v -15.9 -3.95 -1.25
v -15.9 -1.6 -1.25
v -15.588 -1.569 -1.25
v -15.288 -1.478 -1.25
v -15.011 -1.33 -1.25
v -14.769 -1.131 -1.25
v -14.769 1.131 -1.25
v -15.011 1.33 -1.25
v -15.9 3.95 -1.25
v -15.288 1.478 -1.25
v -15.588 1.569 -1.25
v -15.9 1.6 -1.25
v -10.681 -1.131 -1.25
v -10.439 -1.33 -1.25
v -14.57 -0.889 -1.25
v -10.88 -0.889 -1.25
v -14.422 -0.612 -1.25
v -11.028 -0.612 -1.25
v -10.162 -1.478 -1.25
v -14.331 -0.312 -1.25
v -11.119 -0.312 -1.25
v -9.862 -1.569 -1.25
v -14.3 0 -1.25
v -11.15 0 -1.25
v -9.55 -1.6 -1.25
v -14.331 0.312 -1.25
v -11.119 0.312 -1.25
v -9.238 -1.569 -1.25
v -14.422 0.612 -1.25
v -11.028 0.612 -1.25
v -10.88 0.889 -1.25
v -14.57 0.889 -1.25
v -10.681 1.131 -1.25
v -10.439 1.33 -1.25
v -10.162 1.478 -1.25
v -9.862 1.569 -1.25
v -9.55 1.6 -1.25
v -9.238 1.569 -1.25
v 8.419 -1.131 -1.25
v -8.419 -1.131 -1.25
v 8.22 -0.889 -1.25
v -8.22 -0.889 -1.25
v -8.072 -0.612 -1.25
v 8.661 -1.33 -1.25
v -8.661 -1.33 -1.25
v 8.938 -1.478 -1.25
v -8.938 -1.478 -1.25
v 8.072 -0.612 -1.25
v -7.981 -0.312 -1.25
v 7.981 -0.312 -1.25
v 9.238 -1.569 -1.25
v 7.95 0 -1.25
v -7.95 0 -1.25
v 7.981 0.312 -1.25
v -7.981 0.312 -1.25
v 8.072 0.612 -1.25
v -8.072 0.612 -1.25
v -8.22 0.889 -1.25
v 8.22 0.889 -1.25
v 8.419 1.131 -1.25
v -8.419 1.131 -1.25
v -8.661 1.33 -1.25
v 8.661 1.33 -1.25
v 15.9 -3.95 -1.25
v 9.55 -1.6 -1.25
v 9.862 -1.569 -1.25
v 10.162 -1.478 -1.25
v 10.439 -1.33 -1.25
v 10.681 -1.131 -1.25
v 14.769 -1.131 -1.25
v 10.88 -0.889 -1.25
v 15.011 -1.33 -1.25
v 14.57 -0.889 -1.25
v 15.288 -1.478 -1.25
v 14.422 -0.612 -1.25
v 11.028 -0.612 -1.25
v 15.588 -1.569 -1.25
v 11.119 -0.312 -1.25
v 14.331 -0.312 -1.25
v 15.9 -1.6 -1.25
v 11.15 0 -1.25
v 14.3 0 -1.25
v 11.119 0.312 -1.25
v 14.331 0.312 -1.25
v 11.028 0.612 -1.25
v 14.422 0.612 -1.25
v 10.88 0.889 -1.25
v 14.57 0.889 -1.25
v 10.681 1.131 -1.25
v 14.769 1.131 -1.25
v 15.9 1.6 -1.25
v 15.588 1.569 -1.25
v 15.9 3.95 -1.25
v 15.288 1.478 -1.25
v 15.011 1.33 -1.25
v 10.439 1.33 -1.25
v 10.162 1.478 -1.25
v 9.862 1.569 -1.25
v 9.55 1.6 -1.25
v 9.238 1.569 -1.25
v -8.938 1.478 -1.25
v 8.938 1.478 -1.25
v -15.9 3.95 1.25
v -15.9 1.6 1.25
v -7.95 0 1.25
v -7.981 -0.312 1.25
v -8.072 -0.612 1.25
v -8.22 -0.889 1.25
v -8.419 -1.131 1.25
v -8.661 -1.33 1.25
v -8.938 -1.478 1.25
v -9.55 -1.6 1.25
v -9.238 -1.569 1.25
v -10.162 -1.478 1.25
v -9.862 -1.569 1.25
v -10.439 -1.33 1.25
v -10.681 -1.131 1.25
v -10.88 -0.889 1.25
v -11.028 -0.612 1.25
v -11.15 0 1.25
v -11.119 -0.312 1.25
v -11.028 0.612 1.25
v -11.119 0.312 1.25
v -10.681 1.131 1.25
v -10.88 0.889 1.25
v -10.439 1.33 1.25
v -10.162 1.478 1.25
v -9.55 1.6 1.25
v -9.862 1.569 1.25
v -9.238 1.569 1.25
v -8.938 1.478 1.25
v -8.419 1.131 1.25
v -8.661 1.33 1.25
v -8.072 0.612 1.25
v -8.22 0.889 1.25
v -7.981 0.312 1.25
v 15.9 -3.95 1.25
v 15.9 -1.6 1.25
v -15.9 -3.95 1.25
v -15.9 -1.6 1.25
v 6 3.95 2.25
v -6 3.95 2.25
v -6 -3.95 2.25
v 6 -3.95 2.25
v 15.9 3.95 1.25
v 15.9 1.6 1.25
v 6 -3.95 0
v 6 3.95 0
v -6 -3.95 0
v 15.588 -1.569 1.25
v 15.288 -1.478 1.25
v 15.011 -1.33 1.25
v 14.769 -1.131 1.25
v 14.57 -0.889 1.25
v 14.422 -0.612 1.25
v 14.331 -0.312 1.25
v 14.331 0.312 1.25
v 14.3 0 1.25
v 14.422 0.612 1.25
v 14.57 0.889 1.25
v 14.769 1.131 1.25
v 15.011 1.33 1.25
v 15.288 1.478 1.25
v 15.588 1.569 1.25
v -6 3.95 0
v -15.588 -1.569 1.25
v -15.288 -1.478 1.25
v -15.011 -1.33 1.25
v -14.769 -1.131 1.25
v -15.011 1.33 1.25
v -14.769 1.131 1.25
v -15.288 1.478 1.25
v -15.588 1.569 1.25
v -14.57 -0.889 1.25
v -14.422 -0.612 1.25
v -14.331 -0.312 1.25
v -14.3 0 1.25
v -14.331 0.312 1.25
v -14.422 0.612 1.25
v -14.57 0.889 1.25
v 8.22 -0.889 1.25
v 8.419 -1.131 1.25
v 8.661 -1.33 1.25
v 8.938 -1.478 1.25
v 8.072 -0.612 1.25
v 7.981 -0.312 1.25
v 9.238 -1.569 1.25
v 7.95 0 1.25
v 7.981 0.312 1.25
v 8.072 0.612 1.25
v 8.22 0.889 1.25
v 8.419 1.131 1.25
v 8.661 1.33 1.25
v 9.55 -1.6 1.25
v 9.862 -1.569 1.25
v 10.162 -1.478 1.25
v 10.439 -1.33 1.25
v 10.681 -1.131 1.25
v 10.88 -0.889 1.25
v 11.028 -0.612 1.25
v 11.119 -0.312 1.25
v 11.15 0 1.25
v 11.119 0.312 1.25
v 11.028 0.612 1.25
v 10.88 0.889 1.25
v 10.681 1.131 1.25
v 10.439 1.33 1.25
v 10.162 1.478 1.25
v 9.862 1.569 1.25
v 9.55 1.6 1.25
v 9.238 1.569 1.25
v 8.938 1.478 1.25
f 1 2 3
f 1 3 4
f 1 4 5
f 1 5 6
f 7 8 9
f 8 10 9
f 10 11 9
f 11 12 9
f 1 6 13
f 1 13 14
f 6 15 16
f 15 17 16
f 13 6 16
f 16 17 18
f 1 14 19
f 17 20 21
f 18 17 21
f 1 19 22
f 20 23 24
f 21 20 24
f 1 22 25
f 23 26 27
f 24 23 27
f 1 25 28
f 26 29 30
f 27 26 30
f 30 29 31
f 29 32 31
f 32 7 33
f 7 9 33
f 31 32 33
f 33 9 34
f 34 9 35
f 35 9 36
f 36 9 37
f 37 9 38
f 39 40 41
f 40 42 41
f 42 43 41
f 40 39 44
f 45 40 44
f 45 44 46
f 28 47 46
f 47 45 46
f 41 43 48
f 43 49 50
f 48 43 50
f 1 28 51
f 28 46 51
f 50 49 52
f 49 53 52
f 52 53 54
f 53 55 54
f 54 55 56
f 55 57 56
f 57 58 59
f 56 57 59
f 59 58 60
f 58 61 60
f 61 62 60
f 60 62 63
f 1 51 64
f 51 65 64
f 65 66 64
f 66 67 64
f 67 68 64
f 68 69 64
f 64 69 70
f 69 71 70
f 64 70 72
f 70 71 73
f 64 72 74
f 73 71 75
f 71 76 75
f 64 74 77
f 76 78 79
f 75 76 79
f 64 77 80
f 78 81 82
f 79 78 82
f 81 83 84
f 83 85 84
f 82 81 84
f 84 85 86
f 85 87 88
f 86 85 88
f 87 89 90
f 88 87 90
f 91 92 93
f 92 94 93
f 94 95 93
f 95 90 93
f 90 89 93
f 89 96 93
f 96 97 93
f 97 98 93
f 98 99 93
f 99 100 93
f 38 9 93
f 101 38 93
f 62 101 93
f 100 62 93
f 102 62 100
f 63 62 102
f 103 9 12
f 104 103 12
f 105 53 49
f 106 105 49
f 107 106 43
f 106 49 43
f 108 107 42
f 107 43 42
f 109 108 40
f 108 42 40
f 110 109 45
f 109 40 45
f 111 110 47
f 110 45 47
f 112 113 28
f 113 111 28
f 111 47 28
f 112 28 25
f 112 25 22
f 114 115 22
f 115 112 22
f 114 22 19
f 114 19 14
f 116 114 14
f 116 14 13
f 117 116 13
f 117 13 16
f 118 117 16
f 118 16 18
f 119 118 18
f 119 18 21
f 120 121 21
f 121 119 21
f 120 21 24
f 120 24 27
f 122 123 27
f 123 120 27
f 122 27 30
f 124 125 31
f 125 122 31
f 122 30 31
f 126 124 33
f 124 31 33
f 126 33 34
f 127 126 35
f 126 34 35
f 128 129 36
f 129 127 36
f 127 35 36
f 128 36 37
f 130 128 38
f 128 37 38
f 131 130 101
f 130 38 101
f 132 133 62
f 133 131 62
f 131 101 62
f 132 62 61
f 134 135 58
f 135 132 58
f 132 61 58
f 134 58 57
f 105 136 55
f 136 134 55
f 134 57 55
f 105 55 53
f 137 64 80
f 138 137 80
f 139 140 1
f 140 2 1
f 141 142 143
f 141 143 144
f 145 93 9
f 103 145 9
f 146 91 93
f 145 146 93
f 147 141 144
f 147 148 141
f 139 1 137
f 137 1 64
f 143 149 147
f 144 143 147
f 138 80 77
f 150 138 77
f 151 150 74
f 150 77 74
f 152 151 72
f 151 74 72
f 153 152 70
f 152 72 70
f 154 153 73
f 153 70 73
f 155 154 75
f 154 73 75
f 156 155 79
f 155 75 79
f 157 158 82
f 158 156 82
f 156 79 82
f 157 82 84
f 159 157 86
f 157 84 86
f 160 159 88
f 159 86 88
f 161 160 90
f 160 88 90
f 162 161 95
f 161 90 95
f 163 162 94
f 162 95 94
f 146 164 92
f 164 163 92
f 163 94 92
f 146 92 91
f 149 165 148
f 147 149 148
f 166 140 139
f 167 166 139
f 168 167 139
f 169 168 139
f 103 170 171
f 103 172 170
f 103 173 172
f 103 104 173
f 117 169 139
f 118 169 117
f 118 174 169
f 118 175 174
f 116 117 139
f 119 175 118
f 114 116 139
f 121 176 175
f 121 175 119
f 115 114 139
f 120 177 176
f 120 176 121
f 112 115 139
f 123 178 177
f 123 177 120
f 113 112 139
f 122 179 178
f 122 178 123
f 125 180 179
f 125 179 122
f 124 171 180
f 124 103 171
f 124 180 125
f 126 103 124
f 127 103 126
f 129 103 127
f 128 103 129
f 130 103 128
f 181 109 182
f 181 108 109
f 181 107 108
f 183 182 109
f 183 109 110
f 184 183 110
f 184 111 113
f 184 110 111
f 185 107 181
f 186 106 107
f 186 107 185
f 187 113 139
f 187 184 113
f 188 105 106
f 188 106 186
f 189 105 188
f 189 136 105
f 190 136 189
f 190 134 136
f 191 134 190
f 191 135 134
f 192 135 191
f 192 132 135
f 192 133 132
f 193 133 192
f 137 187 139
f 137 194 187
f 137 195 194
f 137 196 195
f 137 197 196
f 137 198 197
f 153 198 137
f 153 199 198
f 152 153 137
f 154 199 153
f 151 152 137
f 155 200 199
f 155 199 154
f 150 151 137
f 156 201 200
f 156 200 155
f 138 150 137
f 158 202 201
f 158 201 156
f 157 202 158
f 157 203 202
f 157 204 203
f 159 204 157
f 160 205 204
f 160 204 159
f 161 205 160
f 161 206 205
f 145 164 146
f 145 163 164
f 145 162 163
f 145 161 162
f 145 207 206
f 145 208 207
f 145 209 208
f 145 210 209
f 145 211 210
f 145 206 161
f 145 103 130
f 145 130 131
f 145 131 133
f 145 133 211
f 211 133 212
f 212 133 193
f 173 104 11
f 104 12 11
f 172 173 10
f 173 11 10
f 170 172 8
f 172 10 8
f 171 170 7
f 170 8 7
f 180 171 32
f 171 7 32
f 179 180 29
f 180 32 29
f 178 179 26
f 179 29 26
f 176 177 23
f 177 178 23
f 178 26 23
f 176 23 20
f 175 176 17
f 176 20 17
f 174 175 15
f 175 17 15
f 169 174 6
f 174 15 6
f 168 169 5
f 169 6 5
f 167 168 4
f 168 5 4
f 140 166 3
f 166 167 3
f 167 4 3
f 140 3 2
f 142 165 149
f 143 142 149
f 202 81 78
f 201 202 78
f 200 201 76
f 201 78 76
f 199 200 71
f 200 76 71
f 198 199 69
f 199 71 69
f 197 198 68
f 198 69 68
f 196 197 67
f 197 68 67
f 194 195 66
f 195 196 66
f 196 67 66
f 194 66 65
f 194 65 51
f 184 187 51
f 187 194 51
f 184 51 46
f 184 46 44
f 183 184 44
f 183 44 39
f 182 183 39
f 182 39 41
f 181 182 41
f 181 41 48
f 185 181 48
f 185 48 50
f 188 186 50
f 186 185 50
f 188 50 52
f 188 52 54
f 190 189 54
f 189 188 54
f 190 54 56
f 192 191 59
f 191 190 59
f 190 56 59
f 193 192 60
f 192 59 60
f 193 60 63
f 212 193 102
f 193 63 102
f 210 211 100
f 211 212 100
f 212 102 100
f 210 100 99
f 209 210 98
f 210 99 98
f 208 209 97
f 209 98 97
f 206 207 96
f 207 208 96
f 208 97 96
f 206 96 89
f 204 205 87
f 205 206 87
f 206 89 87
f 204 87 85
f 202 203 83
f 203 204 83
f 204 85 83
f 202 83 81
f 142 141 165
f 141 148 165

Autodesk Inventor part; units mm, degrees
ref_plane "YZ Plane" through (0, 0, 0) normal (1, 0, 0) x (0, 1, 0)
ref_plane "XZ Plane" through (0, 0, 0) normal (0, 1, 0) x (-1, 0, 0)
ref_plane "XY Plane" through (0, 0, 0) normal (0, 0, 1) x (1, 0, 0)
sketch "Sketch1" plane through (0, 0, 0) normal (0, 0, 1) x (1, 0, 0)
  line L0 (-15.9, -3.95) -> (15.9, -3.95)
  line L1 (15.9, -3.95) -> (15.9, 3.95)
  line L2 (15.9, 3.95) -> (-15.9, 3.95)
  line L3 (-15.9, 3.95) -> (-15.9, -3.95)
  line L4 (-15.9, -3.95) -> (15.9, 3.95) construction
  line L5 (15.9, -3.95) -> (-15.9, 3.95) construction
  line L6 (-15.9, 0) -> (15.9, 0) construction
  line L7 (0, 3.95) -> (0, -3.95) construction
  circle A0 centre (9.55, 0) radius 1.6
  arc A1 (15.9, 1.6) -> (15.9, -1.6) centre (15.9, 0) ccw
  circle A2 centre (-9.55, 0) radius 1.6
  arc A3 (-15.9, -1.6) -> (-15.9, 1.6) centre (-15.9, 0) ccw
  line L8 (6, 3.95) -> (6, -3.95)
  line L9 (-6, 3.95) -> (-6, -3.95)
  point P0 (0, 0)
  point P1 (-15.9, 1.6)
  point P2 (-15.9, -1.6)
  dimension "d0" = 31.8
  dimension "d1" = 7.9
  dimension "d2" = 3.2
  dimension "d3" = 19.1
  dimension "d4" = 12
extrude "Extrusion1" add sketch "Sketch1" along normal mid plane 2.5 contours L3 A3 L2 L9 L0 | L9 L2 L8 L0 | L8 L2 L1 A1 L0
extrude "Extrusion2" add sketch "Sketch1" along normal blind 2.25 separate body contours L9 L2 L8 L0
properties part number "SC700-40kg"
